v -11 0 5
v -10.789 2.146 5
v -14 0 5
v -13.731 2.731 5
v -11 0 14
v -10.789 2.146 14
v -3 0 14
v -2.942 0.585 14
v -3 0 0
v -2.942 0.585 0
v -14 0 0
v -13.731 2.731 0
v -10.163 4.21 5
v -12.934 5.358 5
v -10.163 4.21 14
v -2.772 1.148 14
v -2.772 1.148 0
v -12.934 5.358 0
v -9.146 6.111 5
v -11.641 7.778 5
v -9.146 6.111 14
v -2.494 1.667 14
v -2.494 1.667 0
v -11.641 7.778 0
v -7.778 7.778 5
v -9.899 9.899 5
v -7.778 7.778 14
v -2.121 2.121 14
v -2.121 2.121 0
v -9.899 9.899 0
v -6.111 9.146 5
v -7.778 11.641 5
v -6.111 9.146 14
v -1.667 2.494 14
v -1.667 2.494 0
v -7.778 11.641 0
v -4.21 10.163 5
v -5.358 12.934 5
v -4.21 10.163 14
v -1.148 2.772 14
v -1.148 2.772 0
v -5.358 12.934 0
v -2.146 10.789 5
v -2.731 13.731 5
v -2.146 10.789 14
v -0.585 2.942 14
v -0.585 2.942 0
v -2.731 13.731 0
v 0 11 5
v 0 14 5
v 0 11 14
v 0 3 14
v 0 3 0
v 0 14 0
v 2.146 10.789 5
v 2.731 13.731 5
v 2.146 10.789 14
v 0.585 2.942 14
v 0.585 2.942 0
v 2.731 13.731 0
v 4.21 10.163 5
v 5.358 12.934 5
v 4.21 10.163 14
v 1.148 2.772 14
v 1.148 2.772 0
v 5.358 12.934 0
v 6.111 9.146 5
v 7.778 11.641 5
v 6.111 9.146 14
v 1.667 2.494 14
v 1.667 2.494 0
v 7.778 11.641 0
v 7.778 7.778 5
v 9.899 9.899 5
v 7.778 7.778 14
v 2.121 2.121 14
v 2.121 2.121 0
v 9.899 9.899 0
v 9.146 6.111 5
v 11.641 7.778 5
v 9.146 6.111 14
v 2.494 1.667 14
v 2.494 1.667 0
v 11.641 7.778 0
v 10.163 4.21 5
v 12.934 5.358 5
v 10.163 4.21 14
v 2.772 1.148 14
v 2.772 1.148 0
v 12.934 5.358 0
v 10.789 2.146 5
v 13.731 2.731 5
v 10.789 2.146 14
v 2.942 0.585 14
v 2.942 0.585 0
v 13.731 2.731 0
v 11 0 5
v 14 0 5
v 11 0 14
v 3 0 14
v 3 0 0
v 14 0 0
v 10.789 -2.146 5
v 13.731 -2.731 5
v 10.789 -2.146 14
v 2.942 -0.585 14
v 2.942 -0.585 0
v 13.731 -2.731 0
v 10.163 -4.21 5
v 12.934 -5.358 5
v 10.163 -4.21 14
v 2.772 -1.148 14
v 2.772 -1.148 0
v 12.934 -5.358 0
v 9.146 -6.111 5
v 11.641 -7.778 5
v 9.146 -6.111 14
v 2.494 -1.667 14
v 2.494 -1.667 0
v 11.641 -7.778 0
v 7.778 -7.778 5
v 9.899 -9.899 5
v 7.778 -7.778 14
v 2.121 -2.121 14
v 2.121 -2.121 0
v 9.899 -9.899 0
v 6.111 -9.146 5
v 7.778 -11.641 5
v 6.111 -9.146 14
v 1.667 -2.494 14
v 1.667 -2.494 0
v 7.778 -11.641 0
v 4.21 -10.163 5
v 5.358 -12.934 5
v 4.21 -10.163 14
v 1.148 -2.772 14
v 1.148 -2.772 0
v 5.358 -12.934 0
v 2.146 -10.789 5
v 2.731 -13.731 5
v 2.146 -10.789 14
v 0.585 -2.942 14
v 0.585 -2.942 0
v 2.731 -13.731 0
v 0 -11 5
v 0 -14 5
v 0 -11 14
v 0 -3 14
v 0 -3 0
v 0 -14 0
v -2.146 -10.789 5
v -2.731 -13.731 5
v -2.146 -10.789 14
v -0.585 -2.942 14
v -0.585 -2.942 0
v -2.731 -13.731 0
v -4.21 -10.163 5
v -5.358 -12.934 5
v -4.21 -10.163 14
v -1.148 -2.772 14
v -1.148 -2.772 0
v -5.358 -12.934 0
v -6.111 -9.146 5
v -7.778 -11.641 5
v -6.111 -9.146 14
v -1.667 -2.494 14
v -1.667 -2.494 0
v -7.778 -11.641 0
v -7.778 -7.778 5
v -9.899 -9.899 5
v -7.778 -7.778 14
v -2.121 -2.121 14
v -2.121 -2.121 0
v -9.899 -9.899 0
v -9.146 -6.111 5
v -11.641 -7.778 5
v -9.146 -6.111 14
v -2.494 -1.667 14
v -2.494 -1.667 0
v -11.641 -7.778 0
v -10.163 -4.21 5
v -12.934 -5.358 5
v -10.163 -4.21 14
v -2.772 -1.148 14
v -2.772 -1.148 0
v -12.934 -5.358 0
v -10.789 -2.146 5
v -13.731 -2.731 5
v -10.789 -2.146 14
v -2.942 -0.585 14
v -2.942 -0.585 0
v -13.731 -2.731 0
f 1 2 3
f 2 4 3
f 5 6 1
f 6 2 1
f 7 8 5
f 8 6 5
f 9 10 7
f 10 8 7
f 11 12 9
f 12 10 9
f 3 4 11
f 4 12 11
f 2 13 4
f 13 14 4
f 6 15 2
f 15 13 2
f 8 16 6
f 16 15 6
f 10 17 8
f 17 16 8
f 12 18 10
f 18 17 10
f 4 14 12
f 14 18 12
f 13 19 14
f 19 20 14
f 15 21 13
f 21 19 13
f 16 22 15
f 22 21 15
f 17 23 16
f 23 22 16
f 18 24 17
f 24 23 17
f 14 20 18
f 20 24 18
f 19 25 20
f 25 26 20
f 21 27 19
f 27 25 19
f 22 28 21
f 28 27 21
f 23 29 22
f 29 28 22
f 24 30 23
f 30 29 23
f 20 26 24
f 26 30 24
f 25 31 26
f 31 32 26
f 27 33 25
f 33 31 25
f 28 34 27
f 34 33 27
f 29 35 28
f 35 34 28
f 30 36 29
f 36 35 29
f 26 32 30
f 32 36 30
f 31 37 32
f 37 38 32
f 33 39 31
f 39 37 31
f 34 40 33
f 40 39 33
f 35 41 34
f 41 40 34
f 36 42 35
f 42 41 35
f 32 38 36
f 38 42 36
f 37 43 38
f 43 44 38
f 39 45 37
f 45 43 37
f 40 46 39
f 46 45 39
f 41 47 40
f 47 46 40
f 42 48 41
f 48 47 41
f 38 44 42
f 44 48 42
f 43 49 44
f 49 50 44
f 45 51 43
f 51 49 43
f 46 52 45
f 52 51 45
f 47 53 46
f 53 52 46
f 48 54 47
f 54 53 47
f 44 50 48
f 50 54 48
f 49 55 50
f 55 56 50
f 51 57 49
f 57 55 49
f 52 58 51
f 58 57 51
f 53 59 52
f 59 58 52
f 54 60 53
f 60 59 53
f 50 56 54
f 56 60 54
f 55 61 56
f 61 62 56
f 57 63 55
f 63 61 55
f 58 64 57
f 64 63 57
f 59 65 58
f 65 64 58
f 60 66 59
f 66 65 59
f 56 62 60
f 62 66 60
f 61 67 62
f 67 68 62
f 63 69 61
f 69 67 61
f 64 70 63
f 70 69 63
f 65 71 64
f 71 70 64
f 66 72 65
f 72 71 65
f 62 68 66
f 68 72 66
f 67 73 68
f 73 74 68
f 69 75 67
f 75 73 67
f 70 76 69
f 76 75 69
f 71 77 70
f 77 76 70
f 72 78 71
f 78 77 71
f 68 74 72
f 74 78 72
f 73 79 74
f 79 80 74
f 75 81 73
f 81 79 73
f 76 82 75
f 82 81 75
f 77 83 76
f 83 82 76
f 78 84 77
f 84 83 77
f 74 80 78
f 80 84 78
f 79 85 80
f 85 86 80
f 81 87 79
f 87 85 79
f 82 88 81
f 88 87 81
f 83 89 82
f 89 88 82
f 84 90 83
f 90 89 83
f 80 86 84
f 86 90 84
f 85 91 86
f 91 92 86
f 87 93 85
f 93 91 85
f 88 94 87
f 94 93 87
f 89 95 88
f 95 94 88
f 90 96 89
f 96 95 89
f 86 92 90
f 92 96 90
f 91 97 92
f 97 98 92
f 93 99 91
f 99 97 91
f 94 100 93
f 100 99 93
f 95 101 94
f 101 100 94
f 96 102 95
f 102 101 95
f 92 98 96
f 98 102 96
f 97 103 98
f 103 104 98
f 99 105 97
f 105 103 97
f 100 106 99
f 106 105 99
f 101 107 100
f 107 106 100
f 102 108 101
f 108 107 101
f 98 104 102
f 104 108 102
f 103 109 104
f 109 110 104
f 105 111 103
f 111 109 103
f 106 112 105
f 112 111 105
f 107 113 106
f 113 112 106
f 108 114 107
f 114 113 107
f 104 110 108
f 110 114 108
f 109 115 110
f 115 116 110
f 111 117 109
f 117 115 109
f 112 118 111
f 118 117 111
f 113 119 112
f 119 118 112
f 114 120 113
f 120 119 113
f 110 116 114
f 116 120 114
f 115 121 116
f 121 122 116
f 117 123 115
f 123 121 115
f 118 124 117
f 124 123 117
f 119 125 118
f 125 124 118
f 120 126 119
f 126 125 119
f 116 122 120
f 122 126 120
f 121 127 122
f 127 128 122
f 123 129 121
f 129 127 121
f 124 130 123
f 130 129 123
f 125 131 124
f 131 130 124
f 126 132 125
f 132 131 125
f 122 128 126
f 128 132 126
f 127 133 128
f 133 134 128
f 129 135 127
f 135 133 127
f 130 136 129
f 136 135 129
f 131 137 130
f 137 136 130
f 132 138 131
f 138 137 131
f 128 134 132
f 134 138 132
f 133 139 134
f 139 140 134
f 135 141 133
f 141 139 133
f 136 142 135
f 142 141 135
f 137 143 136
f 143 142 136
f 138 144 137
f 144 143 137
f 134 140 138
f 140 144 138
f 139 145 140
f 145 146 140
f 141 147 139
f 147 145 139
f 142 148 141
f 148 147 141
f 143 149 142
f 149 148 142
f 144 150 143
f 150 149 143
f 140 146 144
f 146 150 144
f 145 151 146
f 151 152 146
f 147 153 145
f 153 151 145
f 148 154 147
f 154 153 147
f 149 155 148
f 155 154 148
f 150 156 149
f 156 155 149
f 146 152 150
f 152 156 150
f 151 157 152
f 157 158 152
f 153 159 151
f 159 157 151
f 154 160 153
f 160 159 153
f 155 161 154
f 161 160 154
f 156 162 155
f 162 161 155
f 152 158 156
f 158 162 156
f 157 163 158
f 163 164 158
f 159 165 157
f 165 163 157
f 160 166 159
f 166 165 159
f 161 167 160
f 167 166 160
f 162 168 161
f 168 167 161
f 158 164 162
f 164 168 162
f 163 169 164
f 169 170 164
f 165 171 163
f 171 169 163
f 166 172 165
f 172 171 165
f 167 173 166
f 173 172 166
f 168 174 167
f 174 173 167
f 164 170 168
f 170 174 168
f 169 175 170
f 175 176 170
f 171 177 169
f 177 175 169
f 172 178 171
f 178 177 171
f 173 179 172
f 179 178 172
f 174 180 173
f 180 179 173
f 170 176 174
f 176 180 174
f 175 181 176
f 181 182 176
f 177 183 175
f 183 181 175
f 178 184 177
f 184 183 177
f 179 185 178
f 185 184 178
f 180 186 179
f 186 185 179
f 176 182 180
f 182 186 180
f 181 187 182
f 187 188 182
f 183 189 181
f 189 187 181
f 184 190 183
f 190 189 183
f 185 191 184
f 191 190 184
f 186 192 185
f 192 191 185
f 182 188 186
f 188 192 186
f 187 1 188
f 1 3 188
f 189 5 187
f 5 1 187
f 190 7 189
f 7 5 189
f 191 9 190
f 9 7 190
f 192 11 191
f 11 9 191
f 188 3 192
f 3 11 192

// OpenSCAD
$fn = 32;

// ----------------------------------------------------------------------
// Arc stop: collar, 14 mm thick
// ----------------------------------------------------------------------

// --- parameters (mm) ---
revolve_angle = 360;      // full turn around the Z axis
profile_points = 6;       // points of the closed outline

profile = [[3, 0], [14, 0], [14, 5], [11, 5], [11, 14], [3, 14]];  // single closed polygon, 6 points, counter clockwise

// --- the one profile operation ---
rotate_extrude(angle = revolve_angle) polygon(points = profile);
